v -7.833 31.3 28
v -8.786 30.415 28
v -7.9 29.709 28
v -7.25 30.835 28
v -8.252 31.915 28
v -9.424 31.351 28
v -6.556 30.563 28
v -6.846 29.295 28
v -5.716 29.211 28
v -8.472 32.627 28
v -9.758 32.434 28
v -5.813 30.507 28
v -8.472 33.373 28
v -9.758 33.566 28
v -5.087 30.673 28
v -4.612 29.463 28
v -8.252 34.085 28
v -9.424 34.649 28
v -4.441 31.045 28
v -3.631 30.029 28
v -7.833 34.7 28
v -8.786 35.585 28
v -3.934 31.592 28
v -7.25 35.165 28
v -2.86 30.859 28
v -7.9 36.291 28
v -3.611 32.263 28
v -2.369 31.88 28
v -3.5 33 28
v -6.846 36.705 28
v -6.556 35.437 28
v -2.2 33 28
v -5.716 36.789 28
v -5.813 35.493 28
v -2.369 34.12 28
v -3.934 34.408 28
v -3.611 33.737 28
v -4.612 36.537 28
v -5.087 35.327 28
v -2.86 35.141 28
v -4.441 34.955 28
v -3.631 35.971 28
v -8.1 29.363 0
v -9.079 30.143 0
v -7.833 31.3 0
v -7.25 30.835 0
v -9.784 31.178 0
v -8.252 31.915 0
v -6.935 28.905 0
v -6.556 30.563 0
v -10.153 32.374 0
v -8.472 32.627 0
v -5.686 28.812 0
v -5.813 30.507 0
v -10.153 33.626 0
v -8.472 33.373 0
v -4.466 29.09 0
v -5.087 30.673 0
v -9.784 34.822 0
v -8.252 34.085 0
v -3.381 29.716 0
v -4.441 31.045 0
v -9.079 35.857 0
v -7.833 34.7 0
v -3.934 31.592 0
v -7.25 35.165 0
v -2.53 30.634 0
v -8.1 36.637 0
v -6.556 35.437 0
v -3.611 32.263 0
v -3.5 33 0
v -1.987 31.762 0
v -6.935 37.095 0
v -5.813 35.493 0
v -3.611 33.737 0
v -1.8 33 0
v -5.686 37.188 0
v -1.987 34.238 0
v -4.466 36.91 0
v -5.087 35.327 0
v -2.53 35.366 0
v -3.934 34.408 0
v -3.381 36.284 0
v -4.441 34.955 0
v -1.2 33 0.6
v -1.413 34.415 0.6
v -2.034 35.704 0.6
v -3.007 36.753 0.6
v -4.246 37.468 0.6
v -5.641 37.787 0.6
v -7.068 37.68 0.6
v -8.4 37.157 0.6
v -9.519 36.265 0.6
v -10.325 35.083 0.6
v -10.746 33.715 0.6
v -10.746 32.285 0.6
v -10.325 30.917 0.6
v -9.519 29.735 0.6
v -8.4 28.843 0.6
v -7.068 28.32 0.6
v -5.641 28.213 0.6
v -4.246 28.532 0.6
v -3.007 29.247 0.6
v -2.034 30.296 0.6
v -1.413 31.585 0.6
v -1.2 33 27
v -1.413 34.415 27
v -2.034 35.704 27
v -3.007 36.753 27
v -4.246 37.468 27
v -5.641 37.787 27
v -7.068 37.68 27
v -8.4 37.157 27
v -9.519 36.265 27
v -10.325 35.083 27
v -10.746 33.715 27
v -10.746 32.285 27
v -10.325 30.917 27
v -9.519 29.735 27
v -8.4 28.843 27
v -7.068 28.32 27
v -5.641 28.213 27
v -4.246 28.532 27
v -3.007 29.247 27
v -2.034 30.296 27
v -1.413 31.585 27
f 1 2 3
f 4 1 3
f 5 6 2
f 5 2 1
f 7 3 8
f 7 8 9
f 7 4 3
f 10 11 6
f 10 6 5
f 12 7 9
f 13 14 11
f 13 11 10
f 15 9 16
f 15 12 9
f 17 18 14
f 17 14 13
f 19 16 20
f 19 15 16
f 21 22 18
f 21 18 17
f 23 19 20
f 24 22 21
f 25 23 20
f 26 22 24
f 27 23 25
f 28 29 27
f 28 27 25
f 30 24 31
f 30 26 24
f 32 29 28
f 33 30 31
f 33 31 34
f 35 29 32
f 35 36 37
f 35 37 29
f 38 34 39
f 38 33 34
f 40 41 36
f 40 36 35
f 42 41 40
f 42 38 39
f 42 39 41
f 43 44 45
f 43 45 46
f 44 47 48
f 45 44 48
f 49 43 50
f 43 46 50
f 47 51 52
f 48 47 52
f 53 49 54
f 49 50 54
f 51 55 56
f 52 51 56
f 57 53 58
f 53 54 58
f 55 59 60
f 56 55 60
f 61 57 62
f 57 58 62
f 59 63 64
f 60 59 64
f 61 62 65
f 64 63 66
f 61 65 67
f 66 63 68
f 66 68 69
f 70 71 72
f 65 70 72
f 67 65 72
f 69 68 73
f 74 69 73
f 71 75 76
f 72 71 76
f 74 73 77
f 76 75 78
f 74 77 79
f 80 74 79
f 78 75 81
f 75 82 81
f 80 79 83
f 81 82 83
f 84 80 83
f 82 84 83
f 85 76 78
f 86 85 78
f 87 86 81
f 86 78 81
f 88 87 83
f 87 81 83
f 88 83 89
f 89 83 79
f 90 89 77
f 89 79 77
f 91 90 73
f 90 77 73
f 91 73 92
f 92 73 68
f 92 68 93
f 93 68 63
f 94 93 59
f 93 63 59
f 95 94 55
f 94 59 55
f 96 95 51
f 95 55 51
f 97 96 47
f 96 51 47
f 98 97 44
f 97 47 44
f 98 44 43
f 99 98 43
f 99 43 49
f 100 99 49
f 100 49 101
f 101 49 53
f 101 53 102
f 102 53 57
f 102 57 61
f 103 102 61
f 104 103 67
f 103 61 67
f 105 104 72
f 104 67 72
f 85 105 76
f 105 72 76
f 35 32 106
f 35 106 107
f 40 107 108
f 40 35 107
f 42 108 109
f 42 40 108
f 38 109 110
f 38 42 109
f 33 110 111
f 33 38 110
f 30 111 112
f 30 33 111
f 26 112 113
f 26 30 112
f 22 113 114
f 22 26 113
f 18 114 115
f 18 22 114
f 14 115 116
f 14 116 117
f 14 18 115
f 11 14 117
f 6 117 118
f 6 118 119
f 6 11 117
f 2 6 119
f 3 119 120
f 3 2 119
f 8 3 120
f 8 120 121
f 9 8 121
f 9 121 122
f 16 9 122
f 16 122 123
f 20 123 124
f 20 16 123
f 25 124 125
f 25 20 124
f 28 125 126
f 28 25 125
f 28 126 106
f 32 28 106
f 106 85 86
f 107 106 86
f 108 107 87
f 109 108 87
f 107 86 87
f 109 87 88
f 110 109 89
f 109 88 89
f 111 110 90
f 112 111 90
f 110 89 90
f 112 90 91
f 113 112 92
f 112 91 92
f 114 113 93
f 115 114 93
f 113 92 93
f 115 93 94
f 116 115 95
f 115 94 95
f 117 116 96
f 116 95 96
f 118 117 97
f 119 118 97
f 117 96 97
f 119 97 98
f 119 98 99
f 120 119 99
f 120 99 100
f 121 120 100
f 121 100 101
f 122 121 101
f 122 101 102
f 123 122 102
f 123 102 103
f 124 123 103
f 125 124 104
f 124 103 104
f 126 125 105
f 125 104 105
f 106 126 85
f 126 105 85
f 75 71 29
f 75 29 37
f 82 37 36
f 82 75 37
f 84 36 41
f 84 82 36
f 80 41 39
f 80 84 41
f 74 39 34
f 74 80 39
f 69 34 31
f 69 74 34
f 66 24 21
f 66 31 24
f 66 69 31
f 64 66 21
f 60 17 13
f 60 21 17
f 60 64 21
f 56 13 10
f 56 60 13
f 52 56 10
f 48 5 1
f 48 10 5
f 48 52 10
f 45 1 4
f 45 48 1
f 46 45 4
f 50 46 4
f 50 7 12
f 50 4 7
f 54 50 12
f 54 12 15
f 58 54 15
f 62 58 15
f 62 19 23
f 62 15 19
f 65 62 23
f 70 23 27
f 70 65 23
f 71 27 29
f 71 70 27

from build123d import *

# Parameters (mm, degrees)
CYLINDER053_R      = 2.5
CYLINDER053_DEPTH  = 50
CYLINDER052_R      = 4.8
CYLINDER052_DEPTH  = 28
CHAMFER006009_SIZE = 1
CHAMFER006010_SIZE = 0.6


with BuildPart() as cylinder063:
    # Cylinder053 → Cylinder053 (new body)
    with BuildSketch(Plane.XY.offset(-4)):
        Circle(CYLINDER053_R)
    extrude(amount=CYLINDER053_DEPTH)


with BuildPart() as locating_cylinder:
    # Cylinder052 → Cylinder052 (new body)
    with BuildSketch(Plane.XY):
        Circle(CYLINDER052_R)
    extrude(amount=CYLINDER052_DEPTH)

    # Cut144: cut Cylinder063
    add(cylinder063.part, mode=Mode.SUBTRACT)


with BuildPart() as locating_cylinder_1:
    # Cut144 placement: moved
    add(locating_cylinder.part.moved(Location((-6, 33, 0))))

    # Chamfer006009
    chamfer006009_edges = [locating_cylinder_1.edges().sort_by_distance(p)[0] for p in [
        (-10.8, 33, 28),
    ]]
    chamfer(chamfer006009_edges, length=CHAMFER006009_SIZE)

    # Chamfer006010
    chamfer006010_edges = [locating_cylinder_1.edges().sort_by_distance(p)[0] for p in [
        (-10.8, 33, 0),
    ]]
    chamfer(chamfer006010_edges, length=CHAMFER006010_SIZE)


solid = locating_cylinder_1.part
